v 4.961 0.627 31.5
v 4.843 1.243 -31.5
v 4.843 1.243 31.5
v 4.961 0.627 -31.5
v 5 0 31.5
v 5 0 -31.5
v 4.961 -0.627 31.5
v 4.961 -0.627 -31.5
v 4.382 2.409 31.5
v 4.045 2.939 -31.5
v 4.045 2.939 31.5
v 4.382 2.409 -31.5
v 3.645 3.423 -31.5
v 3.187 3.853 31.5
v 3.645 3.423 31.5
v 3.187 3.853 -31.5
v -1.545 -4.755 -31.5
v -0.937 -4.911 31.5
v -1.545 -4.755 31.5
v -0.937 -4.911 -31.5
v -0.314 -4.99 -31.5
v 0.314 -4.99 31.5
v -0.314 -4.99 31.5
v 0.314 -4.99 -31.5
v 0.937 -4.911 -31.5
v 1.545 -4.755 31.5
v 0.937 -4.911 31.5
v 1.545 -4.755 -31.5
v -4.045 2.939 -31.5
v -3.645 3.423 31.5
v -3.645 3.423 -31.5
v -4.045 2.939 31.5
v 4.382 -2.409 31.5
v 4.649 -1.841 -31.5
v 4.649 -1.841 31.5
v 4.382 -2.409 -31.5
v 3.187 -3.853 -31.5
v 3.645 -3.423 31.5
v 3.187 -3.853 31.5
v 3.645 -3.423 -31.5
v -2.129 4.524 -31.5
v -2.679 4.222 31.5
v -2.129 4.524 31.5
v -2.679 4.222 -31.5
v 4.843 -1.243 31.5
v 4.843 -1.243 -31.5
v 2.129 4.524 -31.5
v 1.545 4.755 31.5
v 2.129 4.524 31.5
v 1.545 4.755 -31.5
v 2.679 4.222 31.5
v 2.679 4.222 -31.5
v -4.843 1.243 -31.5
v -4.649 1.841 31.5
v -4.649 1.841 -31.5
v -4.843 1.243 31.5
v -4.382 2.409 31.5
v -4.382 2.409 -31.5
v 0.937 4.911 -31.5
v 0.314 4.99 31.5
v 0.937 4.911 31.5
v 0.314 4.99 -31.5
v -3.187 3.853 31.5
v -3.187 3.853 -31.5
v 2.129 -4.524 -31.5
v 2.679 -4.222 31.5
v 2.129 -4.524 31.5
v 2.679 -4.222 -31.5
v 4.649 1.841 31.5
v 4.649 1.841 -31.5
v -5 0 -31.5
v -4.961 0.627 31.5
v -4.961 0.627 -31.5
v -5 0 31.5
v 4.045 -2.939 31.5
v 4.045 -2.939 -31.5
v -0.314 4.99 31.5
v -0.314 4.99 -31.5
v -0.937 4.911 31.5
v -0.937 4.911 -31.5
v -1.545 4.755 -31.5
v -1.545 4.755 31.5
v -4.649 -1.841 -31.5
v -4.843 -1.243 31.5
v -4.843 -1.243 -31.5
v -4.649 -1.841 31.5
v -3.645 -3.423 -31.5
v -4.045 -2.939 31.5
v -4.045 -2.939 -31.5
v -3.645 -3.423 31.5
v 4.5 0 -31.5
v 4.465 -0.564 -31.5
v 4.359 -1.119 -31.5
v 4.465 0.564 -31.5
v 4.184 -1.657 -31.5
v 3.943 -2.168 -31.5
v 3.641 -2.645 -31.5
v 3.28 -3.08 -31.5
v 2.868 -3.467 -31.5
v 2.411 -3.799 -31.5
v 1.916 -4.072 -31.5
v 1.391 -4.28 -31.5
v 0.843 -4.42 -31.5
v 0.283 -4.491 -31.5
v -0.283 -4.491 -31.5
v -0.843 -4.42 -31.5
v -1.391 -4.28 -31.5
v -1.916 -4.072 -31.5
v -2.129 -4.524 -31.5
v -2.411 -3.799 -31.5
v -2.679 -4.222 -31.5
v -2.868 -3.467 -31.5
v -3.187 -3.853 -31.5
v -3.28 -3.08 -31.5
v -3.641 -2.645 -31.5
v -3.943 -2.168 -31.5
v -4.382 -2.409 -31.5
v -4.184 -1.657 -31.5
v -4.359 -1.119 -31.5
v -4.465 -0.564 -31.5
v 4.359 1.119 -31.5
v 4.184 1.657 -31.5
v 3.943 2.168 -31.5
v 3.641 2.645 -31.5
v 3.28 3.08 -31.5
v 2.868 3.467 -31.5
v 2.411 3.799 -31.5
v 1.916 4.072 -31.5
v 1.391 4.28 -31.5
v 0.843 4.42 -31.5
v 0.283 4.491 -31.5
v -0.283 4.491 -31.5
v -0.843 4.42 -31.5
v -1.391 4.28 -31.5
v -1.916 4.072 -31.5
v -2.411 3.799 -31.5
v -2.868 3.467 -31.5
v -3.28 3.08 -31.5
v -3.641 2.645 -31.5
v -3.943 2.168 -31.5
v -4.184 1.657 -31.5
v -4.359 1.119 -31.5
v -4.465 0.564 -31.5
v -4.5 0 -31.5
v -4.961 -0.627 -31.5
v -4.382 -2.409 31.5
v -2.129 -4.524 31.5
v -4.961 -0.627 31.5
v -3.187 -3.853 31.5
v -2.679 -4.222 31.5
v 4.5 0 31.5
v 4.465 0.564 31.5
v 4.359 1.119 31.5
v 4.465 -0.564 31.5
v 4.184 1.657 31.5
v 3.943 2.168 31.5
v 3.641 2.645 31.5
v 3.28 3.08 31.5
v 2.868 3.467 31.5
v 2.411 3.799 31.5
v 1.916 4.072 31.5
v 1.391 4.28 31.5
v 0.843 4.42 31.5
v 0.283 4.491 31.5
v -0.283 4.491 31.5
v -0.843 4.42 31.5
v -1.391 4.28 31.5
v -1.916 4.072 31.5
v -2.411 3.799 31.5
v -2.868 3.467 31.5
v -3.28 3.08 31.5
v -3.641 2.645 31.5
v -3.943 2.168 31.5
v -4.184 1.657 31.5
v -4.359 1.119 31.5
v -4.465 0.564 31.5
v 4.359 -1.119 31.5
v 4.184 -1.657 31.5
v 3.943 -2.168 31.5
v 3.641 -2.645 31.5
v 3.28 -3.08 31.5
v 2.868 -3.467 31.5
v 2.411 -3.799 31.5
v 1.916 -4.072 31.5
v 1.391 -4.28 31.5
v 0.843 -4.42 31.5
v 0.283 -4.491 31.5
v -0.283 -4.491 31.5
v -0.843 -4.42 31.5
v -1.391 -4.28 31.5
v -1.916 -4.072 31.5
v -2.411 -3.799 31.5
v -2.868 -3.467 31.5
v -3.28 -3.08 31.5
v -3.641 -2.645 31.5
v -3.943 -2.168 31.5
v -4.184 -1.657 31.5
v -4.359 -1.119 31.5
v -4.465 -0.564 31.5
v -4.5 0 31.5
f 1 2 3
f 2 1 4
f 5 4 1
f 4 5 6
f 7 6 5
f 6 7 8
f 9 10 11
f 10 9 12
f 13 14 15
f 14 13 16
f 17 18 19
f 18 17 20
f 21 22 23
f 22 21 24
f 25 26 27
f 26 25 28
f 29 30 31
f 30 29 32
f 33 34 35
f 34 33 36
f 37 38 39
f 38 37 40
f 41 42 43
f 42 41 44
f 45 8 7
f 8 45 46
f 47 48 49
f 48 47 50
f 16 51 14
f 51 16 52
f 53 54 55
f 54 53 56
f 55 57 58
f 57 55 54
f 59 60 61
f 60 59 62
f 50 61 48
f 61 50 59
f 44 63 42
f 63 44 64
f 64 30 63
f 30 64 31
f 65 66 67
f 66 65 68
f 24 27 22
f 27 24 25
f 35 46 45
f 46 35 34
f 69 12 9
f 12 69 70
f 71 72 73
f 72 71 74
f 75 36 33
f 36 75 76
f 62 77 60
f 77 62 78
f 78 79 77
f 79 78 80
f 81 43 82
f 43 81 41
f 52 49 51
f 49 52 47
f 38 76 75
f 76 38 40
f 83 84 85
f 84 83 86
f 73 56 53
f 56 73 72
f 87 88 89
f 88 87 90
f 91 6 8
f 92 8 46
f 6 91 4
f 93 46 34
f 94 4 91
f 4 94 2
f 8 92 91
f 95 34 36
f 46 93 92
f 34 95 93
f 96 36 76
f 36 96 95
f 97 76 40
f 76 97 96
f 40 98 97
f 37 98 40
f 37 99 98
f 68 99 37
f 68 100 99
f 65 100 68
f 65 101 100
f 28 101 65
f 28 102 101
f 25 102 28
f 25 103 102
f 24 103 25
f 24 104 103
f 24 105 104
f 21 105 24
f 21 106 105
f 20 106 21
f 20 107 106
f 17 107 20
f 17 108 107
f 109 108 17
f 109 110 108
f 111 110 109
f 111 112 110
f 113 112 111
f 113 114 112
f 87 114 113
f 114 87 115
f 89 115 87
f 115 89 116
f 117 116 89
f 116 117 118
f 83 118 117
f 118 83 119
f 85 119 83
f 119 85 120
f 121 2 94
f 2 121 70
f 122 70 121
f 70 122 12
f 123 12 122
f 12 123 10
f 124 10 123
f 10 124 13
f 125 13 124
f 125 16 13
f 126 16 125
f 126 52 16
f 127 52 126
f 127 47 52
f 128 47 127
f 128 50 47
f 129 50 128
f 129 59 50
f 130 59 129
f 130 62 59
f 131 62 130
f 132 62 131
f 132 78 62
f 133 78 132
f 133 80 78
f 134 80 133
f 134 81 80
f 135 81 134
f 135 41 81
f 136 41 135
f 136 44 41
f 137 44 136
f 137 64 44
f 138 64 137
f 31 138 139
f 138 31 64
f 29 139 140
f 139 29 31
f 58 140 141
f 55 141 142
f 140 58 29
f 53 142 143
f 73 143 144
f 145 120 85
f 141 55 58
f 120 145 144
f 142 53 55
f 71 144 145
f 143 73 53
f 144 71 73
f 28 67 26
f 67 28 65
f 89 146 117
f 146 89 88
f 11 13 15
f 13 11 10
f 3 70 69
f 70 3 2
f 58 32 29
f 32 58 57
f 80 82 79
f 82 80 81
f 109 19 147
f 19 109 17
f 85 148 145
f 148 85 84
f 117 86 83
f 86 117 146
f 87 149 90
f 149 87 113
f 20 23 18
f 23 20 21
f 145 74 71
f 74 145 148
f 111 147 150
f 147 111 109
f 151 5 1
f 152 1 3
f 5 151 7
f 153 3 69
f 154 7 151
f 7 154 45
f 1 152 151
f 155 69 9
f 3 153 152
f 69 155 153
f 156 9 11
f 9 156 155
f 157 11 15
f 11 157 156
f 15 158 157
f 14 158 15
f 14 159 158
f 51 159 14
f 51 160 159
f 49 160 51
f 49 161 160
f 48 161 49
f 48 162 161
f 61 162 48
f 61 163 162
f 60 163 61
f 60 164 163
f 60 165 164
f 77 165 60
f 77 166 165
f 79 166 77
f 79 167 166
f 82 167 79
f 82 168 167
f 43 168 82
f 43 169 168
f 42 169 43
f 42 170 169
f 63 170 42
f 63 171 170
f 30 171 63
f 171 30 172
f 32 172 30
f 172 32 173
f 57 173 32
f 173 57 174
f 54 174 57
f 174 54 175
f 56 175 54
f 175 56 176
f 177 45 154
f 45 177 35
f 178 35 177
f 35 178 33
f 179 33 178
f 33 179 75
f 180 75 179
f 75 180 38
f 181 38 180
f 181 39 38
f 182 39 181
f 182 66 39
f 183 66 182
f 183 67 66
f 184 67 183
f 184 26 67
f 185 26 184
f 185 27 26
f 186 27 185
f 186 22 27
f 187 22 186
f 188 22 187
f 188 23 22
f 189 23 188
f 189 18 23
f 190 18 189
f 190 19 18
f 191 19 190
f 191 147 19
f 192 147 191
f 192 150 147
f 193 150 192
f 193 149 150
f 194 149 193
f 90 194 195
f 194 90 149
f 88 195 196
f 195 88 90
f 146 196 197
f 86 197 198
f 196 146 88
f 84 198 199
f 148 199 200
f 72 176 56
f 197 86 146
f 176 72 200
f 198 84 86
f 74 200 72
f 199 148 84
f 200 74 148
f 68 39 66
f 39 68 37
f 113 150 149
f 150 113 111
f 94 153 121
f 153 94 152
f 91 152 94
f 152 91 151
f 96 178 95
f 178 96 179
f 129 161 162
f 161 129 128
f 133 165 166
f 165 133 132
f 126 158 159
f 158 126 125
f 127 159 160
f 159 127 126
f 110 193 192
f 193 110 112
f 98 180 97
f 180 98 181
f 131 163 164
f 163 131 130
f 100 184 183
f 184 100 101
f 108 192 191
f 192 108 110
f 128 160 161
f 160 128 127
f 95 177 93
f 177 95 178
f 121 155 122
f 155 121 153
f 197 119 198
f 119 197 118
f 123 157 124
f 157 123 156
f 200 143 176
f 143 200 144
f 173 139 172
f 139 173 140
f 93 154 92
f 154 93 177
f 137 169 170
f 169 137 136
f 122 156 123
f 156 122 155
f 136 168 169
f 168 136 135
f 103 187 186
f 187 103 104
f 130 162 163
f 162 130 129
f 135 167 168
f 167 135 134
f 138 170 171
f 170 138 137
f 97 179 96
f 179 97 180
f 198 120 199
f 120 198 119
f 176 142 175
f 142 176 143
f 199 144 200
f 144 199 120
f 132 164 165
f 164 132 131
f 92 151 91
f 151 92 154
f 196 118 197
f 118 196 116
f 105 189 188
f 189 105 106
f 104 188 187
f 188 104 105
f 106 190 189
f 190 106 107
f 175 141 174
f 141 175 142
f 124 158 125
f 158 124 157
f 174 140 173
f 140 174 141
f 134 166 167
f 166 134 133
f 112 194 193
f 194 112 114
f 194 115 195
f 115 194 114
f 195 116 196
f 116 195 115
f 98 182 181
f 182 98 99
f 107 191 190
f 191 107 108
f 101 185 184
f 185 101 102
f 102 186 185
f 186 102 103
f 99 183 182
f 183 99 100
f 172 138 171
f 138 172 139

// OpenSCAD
$fn = 50;


difference() {
	union() {
		translate(v = [0, 0, -31.5000000000]) {
			cylinder(h = 63, r = 5.0000000000);
		}
	}
	union() {
		translate(v = [0, 0, -100.0000000000]) {
			cylinder(h = 200, r = 4.5000000000);
		}
	}
}
